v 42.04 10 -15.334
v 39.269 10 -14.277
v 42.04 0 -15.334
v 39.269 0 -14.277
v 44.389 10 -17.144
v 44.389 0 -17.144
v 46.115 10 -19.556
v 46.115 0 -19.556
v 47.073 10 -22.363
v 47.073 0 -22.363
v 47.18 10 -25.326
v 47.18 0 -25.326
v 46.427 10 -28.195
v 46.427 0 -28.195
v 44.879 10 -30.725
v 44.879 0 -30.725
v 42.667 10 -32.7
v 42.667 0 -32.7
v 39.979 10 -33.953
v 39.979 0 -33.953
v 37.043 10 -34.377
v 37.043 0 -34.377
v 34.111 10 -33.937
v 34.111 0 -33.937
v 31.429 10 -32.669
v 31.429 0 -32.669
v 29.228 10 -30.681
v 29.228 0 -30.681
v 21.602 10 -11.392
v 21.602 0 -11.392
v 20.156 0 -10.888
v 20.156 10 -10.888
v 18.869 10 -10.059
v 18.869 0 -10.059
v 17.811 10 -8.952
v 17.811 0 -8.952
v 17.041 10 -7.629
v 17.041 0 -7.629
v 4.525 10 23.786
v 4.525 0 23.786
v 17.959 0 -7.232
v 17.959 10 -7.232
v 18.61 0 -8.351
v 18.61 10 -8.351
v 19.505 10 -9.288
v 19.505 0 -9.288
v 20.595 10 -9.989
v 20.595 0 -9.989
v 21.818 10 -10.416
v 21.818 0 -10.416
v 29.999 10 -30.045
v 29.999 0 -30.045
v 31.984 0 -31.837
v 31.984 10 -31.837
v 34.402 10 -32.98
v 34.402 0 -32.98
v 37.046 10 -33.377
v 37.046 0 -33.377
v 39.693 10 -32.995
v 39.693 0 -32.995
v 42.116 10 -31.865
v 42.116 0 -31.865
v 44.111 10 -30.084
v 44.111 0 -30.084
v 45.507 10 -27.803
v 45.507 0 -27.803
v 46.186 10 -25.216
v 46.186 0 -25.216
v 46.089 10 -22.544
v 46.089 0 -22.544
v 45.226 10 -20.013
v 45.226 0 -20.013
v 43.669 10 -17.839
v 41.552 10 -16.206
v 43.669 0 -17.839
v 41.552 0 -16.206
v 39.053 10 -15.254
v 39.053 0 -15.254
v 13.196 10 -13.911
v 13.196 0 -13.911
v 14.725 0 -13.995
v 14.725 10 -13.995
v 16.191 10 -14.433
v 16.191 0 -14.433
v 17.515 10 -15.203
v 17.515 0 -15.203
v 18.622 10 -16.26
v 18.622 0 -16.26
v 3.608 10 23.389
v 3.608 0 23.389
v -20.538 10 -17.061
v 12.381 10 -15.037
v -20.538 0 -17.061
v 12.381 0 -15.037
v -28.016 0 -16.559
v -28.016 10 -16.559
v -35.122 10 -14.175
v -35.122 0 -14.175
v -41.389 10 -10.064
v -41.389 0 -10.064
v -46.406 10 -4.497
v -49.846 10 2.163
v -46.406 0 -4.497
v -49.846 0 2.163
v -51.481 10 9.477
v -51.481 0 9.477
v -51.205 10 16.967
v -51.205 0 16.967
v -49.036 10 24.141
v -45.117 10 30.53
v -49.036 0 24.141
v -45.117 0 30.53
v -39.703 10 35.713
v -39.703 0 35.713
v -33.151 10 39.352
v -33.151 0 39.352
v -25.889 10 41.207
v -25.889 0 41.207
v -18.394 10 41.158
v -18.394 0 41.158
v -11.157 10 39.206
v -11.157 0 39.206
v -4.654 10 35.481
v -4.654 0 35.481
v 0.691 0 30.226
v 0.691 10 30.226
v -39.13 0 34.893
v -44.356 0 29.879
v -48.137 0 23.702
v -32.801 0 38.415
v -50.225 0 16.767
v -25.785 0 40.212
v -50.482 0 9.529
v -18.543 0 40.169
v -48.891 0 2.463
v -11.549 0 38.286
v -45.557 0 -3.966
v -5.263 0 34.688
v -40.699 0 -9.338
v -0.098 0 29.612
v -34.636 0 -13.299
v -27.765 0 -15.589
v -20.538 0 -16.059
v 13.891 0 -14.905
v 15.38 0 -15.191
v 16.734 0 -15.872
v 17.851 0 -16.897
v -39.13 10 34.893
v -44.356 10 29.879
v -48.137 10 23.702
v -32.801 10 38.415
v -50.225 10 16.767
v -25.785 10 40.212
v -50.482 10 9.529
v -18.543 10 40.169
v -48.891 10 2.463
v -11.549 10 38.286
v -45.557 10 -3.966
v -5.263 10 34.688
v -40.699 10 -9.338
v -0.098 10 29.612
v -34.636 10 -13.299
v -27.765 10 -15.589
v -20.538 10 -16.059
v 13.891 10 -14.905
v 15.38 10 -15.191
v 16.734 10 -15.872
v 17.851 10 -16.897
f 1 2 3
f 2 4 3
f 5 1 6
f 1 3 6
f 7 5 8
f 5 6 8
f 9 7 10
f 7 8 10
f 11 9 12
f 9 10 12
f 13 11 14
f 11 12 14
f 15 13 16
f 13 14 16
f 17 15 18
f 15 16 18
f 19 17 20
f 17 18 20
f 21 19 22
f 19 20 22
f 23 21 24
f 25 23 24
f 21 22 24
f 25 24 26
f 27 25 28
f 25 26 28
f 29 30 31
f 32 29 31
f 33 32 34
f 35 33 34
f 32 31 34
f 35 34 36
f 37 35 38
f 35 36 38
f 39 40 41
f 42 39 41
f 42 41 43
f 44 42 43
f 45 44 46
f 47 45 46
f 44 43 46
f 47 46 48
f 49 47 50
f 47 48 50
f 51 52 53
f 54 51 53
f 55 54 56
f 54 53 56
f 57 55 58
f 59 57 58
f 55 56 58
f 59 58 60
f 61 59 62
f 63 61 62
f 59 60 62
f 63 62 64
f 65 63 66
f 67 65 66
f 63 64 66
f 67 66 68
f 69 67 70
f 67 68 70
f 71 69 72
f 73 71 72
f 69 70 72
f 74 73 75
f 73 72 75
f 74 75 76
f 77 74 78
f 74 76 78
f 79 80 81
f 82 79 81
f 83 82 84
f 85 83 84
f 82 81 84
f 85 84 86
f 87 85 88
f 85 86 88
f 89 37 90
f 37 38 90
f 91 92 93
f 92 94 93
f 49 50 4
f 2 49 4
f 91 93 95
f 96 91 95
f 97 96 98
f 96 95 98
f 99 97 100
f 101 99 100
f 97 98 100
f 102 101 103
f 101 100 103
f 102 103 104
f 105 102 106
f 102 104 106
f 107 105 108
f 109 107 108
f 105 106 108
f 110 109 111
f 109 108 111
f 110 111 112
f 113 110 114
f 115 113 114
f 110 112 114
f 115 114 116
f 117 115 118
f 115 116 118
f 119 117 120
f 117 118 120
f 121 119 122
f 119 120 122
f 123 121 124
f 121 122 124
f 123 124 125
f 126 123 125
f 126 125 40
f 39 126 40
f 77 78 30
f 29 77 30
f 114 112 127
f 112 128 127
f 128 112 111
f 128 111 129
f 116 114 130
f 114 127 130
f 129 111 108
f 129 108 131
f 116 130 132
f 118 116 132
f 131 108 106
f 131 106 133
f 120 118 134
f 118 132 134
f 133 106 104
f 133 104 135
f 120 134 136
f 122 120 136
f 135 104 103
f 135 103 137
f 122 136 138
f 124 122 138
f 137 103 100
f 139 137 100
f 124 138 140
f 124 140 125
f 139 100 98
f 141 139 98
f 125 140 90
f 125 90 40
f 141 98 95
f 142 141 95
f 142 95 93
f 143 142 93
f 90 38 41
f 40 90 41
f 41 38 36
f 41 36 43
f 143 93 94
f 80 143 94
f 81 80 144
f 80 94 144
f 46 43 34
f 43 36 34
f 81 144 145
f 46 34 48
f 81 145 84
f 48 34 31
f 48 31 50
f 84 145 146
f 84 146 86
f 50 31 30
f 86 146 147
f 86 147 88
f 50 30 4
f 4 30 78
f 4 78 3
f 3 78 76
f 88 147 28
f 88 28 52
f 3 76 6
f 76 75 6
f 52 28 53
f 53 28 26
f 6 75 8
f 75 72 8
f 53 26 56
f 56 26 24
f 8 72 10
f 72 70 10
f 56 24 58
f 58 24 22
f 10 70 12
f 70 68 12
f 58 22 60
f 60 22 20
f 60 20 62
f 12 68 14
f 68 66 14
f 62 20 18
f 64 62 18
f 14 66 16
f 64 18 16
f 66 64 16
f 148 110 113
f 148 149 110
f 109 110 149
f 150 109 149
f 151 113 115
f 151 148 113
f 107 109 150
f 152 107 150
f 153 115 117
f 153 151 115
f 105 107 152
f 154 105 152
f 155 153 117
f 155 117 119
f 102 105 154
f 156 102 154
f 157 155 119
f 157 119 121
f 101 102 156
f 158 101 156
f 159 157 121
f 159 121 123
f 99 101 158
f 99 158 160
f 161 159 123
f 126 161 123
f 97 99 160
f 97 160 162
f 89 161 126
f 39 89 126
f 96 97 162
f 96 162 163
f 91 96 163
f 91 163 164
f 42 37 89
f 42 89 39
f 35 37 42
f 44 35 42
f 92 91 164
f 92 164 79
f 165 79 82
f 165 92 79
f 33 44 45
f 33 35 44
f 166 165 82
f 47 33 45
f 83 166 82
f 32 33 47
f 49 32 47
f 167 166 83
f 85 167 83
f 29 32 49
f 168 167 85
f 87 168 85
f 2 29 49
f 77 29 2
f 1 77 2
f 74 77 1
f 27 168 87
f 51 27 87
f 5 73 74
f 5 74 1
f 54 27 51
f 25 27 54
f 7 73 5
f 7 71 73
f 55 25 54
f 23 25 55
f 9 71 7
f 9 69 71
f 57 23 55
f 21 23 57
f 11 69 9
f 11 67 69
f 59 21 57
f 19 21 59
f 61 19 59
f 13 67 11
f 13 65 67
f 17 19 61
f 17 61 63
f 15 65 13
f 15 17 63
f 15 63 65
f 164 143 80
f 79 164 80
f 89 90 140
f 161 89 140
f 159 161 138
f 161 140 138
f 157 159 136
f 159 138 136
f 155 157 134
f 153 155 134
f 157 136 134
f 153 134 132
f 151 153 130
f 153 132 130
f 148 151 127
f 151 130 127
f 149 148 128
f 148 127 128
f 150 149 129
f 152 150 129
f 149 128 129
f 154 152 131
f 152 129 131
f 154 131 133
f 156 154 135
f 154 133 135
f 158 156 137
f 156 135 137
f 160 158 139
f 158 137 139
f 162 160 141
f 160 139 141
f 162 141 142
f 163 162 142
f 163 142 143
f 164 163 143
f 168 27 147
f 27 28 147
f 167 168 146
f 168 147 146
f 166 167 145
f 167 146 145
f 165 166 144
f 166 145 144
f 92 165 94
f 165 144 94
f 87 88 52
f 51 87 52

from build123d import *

# Parameters (mm, degrees)
BOSS_EXTRUDE1_DEPTH = 7
BOSS_EXTRUDE2_DEPTH = 3


with BuildPart() as part:
    # Sketch1 → Boss-Extrude1 (new body)
    with BuildSketch(Plane(origin=(0, 0, 0), x_dir=(1, 0, 0), z_dir=(0, 1, 0))):
        with BuildLine():
            Line((29.22824924, 30.681159688), (17.850659856, 16.897054356))
            ThreePointArc((17.850659856, 16.897054356), (15.379675631, 15.1910369), (12.380917697, 15.03705815))
            Line((12.380917697, 15.03705815), (-20.537634361, 17.060906053))
            ThreePointArc((-20.537634361, 17.060906053), (-47.281869491, -27.461627718), (4.525488573, -23.786335009))
            Line((4.525488573, -23.786335009), (17.958953394, 7.231589211))
            ThreePointArc((17.958953394, 7.231589211), (19.505297976, 9.287886756), (21.817685297, 10.415896524))
            Line((21.817685297, 10.415896524), (39.268754989, 14.277407445))
            ThreePointArc((39.268754989, 14.277407445), (45.745634232, 29.516516233), (29.22824924, 30.681159688))
        make_face()
        with BuildLine():
            ThreePointArc((3.607850555, -23.388917762), (-46.445589463, -26.91243355), (-20.537634361, 16.058950924))
            Line((-20.537634361, 16.058950924), (13.195989156, 13.911337267))
            ThreePointArc((13.195989156, 13.911337267), (16.191497408, 14.433261737), (18.621876492, 16.260481579))
            Line((18.621876492, 16.260481579), (29.999465876, 30.044586911))
            ThreePointArc((29.999465876, 30.044586911), (44.89272255, 28.994461003), (39.05270459, 15.253789658))
            Line((39.05270459, 15.253789658), (21.601634898, 11.392278737))
            ThreePointArc((21.601634898, 11.392278737), (18.868813518, 10.059176283), (17.041315376, 7.629006457))
            Line((17.041315376, 7.629006457), (3.607850555, -23.388917762))
        make_face(mode=Mode.SUBTRACT)
    extrude(amount=BOSS_EXTRUDE1_DEPTH)

    # Sketch2 → Boss-Extrude2 (add)
    with BuildSketch(Plane(origin=(0, 7, 0), x_dir=(1, 0, 0), z_dir=(0, 1, 0))):
        with BuildLine():
            Line((21.817685297, 10.415896524), (39.268754989, 14.277407445))
            ThreePointArc((39.268754989, 14.277407445), (45.745634232, 29.516516233), (29.22824924, 30.681159688))
            Line((29.22824924, 30.681159688), (17.850659856, 16.897054356))
            ThreePointArc((17.850659856, 16.897054356), (15.379675631, 15.1910369), (12.380917697, 15.03705815))
            Line((12.380917697, 15.03705815), (-20.537634361, 17.060906053))
            ThreePointArc((-20.537634361, 17.060906053), (-47.281869491, -27.461627718), (4.525488573, -23.786335009))
            Line((4.525488573, -23.786335009), (17.958953394, 7.231589211))
            ThreePointArc((17.958953394, 7.231589211), (19.505297976, 9.287886756), (21.817685297, 10.415896524))
        make_face()
        with BuildLine():
            Line((17.041315376, 7.629006457), (3.607850555, -23.388917762))
            ThreePointArc((3.607850555, -23.388917762), (-46.445589463, -26.91243355), (-20.537634361, 16.058950924))
            Line((-20.537634361, 16.058950924), (13.195989156, 13.911337267))
            ThreePointArc((13.195989156, 13.911337267), (16.191497408, 14.433261737), (18.621876492, 16.260481579))
            Line((18.621876492, 16.260481579), (29.999465876, 30.044586911))
            ThreePointArc((29.999465876, 30.044586911), (44.89272255, 28.994461003), (39.05270459, 15.253789658))
            Line((39.05270459, 15.253789658), (21.601634898, 11.392278737))
            ThreePointArc((21.601634898, 11.392278737), (18.868813518, 10.059176283), (17.041315376, 7.629006457))
        make_face(mode=Mode.SUBTRACT)
    extrude(amount=BOSS_EXTRUDE2_DEPTH)


solid = part.part
